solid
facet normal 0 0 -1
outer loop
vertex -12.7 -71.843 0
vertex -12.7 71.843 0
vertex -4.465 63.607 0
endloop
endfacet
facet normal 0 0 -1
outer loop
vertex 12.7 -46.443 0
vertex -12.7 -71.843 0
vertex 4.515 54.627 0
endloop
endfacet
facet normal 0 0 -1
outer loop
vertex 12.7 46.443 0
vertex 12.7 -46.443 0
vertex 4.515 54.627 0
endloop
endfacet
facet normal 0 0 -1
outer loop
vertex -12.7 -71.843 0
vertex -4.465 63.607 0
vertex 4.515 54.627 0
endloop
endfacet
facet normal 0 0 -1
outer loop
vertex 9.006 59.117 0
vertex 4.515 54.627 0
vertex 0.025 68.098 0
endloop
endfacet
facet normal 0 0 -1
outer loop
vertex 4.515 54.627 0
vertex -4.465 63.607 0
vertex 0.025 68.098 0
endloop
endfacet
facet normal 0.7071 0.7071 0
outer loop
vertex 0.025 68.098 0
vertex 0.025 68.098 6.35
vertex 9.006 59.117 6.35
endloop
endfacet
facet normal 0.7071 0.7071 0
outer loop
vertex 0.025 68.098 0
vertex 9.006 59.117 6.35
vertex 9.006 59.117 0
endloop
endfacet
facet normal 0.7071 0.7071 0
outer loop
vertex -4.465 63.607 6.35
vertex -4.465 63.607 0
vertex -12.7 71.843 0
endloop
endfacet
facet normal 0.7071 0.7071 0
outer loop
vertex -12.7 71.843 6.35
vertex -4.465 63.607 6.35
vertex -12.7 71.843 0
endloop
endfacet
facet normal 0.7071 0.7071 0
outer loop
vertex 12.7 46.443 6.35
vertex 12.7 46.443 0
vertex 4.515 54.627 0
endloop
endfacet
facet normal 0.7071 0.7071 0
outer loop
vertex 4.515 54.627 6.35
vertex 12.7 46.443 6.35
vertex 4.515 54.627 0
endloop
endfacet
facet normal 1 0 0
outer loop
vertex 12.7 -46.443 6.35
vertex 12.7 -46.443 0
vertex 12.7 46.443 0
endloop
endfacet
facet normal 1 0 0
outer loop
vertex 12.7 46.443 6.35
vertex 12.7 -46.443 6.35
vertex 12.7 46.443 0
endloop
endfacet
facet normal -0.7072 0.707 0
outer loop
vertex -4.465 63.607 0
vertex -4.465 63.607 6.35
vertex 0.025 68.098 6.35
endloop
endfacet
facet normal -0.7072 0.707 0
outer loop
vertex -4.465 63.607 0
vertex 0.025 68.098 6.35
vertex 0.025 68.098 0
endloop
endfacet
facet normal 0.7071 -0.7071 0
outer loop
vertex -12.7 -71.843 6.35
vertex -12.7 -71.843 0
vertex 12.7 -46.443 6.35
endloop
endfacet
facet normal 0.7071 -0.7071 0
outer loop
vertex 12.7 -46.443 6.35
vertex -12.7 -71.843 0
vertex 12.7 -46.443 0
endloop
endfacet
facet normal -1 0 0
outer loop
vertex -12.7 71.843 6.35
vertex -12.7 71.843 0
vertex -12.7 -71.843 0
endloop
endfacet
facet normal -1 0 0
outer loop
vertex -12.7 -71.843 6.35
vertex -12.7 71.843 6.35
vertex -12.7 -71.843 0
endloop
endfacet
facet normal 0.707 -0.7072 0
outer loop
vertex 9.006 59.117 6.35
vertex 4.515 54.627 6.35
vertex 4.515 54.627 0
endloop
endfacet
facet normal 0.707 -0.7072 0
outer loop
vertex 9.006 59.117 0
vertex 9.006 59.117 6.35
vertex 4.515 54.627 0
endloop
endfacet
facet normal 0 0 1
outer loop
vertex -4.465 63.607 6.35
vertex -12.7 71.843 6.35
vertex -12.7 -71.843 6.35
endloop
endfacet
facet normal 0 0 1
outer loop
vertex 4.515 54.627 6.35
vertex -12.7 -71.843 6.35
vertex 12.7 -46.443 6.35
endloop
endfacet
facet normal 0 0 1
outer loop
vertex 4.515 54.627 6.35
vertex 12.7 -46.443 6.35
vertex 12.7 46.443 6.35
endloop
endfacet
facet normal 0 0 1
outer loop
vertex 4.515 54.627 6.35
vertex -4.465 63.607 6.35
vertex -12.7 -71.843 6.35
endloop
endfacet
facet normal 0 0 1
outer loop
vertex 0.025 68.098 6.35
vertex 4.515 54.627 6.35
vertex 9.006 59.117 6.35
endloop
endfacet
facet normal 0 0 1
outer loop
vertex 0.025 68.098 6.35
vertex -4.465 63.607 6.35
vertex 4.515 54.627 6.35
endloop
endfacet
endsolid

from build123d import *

# Parameters (mm, degrees)
BOSS_EXTRU_1_DEPTH = 6.35
ESQUISSE2_W        = 6.35
ESQUISSE2_H        = 12.7
BOSS_EXTRU_2_DEPTH = 6.35


with BuildPart() as part:
    # Esquisse1 → Boss.-Extru.1 (new body)
    with BuildSketch(Plane.XY):
        Polygon((-12.7, -71.84263), (12.7, -46.44263), (12.7, 46.44263), (-12.7, 71.84263), align=None)
    extrude(amount=BOSS_EXTRU_1_DEPTH)

    # Esquisse2 → Boss.-Extru.2 (add)
    with BuildSketch(Plane(origin=(29.571315, 29.571315, 0), x_dir=(0, 0, -1), z_dir=(0.707106781186549, 0.7071067811865461, 0))):
        with Locations((-3.175, 41.784422488)):
            Rectangle(ESQUISSE2_W, ESQUISSE2_H)
    extrude(amount=BOSS_EXTRU_2_DEPTH)


solid = part.part
